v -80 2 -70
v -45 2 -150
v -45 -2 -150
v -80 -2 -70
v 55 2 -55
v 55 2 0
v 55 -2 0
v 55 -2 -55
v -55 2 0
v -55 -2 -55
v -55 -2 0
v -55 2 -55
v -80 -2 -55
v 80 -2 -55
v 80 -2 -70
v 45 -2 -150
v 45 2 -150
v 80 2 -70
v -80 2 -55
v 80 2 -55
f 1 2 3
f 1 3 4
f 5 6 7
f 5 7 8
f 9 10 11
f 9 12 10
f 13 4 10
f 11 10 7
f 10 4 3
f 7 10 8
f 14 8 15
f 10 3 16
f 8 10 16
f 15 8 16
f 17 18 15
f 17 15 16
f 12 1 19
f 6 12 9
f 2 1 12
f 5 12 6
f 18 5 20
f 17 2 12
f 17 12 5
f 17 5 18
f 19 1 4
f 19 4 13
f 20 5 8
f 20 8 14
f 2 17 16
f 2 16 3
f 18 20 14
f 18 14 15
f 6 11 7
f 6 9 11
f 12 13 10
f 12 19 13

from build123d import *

# Parameters (mm, degrees)
SALIENTE_EXTRUIR1_DEPTH = 2


with BuildPart() as part:
    # Croquis1 → Saliente-Extruir1 (new, symmetric)
    with BuildSketch(Plane(origin=(0, 0, 0), x_dir=(1, 0, 0), z_dir=(0, 1, 0))):
        Polygon((-55, 0), (0, 0), (0, 150), (-45, 150), (-80, 70), (-80, 55), (-55, 55), align=None)
        Polygon((0, 150), (0, 0), (55, 0), (55, 55), (80, 55), (80, 70), (45, 150), align=None)
    extrude(amount=SALIENTE_EXTRUIR1_DEPTH, both=True)


solid = part.part
